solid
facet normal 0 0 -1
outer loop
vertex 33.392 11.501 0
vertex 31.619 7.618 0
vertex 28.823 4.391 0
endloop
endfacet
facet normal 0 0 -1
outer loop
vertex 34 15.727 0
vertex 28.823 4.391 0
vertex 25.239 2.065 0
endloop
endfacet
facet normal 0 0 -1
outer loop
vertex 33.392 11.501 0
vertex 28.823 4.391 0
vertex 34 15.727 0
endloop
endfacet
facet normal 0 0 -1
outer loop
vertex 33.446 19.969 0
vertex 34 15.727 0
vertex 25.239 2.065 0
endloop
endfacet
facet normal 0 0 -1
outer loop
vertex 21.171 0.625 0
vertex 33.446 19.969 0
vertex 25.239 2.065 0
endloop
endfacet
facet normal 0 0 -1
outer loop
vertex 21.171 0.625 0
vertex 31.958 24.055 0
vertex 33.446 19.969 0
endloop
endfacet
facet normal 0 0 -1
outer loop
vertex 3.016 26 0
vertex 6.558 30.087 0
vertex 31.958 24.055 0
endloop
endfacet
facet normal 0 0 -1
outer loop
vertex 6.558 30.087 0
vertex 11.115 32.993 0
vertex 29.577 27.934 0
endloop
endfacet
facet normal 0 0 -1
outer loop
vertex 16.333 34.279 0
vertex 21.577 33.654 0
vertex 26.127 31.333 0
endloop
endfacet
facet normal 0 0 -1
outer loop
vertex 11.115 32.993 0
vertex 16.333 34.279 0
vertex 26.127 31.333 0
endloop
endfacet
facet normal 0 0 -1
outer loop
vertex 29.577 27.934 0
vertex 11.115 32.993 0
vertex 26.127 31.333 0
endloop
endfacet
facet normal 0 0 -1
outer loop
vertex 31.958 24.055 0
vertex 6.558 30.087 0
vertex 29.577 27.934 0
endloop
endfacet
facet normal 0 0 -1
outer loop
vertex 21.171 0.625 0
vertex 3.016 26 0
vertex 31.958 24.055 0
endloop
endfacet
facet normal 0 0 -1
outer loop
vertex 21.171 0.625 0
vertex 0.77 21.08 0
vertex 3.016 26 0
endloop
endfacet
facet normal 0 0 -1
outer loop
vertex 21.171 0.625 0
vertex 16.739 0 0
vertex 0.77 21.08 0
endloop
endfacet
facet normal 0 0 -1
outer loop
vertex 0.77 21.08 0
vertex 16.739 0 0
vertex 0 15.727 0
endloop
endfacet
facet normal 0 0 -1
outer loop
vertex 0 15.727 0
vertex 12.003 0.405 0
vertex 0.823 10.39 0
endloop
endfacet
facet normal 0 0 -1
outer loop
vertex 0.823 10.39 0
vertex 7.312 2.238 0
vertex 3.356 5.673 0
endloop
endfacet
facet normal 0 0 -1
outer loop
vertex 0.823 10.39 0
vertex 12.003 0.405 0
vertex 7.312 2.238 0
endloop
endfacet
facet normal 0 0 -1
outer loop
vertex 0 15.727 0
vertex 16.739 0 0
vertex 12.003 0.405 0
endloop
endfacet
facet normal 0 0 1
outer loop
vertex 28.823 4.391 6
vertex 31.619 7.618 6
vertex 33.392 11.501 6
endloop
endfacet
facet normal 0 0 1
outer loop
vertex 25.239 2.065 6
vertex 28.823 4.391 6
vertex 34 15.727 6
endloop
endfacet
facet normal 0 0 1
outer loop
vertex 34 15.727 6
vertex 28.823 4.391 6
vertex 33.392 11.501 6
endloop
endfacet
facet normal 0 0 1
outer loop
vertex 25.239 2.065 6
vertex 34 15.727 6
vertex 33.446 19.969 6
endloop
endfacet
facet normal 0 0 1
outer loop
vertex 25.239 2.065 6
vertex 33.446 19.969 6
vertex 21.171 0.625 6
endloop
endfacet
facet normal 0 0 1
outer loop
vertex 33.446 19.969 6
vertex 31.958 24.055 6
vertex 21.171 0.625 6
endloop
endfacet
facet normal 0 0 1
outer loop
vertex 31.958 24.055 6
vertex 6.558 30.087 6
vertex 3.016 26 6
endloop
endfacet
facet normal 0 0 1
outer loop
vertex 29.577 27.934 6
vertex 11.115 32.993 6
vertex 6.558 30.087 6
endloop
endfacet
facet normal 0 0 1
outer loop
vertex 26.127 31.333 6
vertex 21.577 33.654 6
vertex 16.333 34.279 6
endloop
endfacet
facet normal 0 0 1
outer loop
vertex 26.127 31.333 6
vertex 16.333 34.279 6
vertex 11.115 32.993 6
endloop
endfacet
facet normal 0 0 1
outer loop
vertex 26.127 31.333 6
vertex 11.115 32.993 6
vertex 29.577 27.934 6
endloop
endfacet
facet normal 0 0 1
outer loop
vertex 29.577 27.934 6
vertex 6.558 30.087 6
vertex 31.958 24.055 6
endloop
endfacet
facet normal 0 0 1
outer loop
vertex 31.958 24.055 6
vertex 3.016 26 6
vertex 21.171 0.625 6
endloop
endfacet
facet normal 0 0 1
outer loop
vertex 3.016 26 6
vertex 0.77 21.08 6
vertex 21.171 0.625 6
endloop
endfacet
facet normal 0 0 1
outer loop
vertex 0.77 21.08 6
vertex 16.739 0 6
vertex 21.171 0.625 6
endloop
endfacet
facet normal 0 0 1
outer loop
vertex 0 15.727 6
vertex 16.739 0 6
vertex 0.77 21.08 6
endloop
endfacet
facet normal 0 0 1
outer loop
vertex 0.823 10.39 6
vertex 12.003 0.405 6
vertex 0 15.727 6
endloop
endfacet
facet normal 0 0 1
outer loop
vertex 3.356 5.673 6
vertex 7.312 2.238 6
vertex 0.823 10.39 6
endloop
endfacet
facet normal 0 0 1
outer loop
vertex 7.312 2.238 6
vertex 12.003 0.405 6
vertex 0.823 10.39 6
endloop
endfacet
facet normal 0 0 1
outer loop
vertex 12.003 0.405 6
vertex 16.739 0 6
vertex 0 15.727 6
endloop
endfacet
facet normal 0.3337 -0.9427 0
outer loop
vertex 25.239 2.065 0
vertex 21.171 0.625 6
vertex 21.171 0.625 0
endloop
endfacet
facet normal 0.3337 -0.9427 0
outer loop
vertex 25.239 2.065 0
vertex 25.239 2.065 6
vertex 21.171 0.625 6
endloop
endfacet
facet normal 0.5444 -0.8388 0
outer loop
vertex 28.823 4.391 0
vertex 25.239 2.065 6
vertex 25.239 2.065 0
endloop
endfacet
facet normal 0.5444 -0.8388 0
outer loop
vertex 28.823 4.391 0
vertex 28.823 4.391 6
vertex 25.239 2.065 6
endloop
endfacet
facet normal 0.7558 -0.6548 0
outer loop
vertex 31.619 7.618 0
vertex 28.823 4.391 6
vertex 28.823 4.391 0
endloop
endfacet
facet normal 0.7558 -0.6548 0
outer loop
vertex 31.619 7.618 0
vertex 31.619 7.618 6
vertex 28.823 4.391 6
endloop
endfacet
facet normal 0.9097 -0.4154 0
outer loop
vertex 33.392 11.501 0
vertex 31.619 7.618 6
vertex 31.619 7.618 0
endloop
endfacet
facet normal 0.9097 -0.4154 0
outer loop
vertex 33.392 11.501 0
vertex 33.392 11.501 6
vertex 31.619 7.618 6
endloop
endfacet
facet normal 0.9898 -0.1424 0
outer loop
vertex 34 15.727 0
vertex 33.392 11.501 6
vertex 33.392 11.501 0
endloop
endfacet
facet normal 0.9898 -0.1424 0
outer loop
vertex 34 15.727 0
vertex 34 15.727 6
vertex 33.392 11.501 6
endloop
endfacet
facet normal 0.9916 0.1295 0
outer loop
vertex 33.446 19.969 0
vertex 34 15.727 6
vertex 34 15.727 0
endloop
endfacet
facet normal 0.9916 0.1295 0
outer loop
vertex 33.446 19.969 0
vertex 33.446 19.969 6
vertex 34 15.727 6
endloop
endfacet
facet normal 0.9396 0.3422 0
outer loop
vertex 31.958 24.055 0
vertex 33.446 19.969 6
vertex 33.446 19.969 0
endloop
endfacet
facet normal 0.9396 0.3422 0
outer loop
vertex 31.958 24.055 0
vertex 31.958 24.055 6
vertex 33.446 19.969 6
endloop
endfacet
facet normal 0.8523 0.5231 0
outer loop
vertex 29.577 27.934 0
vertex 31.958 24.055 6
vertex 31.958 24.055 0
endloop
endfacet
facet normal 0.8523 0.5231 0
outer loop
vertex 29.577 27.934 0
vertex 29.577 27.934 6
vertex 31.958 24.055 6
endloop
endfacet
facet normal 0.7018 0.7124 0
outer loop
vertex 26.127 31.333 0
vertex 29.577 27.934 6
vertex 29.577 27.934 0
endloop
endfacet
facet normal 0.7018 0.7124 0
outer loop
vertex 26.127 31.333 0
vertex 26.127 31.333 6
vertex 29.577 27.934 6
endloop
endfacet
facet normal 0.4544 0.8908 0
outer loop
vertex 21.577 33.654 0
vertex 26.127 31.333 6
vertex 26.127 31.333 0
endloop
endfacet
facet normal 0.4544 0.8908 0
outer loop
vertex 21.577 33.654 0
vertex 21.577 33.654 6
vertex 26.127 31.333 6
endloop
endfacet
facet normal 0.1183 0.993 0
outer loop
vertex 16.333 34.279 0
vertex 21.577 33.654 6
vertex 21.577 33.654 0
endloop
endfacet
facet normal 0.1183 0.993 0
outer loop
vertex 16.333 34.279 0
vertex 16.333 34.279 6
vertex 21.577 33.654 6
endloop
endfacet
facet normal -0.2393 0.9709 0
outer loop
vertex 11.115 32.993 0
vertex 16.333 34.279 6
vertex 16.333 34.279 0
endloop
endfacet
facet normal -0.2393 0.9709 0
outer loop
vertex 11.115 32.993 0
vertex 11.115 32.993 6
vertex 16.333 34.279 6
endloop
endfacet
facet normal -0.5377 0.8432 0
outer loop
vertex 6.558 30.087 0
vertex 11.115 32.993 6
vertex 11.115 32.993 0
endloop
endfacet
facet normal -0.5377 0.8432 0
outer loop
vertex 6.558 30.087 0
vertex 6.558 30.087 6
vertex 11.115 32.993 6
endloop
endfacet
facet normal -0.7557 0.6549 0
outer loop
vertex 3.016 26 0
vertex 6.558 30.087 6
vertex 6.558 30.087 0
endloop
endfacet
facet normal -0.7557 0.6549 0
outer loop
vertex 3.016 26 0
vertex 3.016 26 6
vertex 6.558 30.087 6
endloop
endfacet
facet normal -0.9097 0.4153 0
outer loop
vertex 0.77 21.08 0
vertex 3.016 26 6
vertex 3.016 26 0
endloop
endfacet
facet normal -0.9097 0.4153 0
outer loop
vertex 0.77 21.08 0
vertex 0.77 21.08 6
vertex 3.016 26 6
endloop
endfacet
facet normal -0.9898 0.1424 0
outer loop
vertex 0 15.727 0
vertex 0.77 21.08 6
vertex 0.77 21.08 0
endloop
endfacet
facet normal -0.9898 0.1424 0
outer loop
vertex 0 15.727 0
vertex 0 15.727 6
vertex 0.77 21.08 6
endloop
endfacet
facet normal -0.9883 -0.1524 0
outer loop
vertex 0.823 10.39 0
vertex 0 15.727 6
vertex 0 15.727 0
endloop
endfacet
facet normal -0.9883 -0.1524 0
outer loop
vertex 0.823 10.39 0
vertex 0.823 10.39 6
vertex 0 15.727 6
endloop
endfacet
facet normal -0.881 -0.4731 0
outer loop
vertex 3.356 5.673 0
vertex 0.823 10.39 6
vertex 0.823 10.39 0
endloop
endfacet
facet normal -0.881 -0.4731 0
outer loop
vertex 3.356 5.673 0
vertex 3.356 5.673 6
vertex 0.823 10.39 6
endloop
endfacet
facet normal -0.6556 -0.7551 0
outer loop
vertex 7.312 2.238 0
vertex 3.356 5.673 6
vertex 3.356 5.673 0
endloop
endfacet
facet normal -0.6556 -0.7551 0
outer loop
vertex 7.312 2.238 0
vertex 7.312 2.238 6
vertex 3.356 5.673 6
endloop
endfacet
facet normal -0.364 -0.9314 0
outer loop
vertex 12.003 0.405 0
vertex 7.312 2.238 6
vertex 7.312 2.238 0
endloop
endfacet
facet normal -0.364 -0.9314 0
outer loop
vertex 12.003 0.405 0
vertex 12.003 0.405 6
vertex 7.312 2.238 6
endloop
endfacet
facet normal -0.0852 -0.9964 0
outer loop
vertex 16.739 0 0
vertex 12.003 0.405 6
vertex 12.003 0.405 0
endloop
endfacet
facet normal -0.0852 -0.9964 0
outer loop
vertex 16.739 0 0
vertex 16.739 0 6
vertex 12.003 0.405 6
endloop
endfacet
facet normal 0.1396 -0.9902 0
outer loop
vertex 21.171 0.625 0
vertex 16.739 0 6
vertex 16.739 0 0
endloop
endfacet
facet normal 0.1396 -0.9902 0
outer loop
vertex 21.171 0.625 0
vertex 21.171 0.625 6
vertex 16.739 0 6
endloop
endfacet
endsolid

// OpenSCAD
$fn = 32;
// ----------------------------------------------------------------------
// Cam disc: base radius 15.0 mm, lift 4.0 mm, 22 profile points
// ----------------------------------------------------------------------

// --- parameters (mm) ---
profile_height = 6;       // extrusion height
profile_points = 22;      // points of the closed outline

profile = [[34, 15.727], [33.446, 19.969], [31.958, 24.055], [29.577, 27.934], [26.127, 31.333], [21.577, 33.654], [16.333, 34.279], [11.115, 32.993], [6.558, 30.087], [3.016, 26], [0.77, 21.08], [0, 15.727], [0.823, 10.39], [3.356, 5.673], [7.312, 2.238], [12.003, 0.405], [16.739, 0], [21.171, 0.625], [25.239, 2.065], [28.823, 4.391], [31.619, 7.618], [33.392, 11.501]];  // single closed polygon, 22 points, counter clockwise

// --- the one profile operation ---
linear_extrude(height = profile_height) polygon(points = profile);
